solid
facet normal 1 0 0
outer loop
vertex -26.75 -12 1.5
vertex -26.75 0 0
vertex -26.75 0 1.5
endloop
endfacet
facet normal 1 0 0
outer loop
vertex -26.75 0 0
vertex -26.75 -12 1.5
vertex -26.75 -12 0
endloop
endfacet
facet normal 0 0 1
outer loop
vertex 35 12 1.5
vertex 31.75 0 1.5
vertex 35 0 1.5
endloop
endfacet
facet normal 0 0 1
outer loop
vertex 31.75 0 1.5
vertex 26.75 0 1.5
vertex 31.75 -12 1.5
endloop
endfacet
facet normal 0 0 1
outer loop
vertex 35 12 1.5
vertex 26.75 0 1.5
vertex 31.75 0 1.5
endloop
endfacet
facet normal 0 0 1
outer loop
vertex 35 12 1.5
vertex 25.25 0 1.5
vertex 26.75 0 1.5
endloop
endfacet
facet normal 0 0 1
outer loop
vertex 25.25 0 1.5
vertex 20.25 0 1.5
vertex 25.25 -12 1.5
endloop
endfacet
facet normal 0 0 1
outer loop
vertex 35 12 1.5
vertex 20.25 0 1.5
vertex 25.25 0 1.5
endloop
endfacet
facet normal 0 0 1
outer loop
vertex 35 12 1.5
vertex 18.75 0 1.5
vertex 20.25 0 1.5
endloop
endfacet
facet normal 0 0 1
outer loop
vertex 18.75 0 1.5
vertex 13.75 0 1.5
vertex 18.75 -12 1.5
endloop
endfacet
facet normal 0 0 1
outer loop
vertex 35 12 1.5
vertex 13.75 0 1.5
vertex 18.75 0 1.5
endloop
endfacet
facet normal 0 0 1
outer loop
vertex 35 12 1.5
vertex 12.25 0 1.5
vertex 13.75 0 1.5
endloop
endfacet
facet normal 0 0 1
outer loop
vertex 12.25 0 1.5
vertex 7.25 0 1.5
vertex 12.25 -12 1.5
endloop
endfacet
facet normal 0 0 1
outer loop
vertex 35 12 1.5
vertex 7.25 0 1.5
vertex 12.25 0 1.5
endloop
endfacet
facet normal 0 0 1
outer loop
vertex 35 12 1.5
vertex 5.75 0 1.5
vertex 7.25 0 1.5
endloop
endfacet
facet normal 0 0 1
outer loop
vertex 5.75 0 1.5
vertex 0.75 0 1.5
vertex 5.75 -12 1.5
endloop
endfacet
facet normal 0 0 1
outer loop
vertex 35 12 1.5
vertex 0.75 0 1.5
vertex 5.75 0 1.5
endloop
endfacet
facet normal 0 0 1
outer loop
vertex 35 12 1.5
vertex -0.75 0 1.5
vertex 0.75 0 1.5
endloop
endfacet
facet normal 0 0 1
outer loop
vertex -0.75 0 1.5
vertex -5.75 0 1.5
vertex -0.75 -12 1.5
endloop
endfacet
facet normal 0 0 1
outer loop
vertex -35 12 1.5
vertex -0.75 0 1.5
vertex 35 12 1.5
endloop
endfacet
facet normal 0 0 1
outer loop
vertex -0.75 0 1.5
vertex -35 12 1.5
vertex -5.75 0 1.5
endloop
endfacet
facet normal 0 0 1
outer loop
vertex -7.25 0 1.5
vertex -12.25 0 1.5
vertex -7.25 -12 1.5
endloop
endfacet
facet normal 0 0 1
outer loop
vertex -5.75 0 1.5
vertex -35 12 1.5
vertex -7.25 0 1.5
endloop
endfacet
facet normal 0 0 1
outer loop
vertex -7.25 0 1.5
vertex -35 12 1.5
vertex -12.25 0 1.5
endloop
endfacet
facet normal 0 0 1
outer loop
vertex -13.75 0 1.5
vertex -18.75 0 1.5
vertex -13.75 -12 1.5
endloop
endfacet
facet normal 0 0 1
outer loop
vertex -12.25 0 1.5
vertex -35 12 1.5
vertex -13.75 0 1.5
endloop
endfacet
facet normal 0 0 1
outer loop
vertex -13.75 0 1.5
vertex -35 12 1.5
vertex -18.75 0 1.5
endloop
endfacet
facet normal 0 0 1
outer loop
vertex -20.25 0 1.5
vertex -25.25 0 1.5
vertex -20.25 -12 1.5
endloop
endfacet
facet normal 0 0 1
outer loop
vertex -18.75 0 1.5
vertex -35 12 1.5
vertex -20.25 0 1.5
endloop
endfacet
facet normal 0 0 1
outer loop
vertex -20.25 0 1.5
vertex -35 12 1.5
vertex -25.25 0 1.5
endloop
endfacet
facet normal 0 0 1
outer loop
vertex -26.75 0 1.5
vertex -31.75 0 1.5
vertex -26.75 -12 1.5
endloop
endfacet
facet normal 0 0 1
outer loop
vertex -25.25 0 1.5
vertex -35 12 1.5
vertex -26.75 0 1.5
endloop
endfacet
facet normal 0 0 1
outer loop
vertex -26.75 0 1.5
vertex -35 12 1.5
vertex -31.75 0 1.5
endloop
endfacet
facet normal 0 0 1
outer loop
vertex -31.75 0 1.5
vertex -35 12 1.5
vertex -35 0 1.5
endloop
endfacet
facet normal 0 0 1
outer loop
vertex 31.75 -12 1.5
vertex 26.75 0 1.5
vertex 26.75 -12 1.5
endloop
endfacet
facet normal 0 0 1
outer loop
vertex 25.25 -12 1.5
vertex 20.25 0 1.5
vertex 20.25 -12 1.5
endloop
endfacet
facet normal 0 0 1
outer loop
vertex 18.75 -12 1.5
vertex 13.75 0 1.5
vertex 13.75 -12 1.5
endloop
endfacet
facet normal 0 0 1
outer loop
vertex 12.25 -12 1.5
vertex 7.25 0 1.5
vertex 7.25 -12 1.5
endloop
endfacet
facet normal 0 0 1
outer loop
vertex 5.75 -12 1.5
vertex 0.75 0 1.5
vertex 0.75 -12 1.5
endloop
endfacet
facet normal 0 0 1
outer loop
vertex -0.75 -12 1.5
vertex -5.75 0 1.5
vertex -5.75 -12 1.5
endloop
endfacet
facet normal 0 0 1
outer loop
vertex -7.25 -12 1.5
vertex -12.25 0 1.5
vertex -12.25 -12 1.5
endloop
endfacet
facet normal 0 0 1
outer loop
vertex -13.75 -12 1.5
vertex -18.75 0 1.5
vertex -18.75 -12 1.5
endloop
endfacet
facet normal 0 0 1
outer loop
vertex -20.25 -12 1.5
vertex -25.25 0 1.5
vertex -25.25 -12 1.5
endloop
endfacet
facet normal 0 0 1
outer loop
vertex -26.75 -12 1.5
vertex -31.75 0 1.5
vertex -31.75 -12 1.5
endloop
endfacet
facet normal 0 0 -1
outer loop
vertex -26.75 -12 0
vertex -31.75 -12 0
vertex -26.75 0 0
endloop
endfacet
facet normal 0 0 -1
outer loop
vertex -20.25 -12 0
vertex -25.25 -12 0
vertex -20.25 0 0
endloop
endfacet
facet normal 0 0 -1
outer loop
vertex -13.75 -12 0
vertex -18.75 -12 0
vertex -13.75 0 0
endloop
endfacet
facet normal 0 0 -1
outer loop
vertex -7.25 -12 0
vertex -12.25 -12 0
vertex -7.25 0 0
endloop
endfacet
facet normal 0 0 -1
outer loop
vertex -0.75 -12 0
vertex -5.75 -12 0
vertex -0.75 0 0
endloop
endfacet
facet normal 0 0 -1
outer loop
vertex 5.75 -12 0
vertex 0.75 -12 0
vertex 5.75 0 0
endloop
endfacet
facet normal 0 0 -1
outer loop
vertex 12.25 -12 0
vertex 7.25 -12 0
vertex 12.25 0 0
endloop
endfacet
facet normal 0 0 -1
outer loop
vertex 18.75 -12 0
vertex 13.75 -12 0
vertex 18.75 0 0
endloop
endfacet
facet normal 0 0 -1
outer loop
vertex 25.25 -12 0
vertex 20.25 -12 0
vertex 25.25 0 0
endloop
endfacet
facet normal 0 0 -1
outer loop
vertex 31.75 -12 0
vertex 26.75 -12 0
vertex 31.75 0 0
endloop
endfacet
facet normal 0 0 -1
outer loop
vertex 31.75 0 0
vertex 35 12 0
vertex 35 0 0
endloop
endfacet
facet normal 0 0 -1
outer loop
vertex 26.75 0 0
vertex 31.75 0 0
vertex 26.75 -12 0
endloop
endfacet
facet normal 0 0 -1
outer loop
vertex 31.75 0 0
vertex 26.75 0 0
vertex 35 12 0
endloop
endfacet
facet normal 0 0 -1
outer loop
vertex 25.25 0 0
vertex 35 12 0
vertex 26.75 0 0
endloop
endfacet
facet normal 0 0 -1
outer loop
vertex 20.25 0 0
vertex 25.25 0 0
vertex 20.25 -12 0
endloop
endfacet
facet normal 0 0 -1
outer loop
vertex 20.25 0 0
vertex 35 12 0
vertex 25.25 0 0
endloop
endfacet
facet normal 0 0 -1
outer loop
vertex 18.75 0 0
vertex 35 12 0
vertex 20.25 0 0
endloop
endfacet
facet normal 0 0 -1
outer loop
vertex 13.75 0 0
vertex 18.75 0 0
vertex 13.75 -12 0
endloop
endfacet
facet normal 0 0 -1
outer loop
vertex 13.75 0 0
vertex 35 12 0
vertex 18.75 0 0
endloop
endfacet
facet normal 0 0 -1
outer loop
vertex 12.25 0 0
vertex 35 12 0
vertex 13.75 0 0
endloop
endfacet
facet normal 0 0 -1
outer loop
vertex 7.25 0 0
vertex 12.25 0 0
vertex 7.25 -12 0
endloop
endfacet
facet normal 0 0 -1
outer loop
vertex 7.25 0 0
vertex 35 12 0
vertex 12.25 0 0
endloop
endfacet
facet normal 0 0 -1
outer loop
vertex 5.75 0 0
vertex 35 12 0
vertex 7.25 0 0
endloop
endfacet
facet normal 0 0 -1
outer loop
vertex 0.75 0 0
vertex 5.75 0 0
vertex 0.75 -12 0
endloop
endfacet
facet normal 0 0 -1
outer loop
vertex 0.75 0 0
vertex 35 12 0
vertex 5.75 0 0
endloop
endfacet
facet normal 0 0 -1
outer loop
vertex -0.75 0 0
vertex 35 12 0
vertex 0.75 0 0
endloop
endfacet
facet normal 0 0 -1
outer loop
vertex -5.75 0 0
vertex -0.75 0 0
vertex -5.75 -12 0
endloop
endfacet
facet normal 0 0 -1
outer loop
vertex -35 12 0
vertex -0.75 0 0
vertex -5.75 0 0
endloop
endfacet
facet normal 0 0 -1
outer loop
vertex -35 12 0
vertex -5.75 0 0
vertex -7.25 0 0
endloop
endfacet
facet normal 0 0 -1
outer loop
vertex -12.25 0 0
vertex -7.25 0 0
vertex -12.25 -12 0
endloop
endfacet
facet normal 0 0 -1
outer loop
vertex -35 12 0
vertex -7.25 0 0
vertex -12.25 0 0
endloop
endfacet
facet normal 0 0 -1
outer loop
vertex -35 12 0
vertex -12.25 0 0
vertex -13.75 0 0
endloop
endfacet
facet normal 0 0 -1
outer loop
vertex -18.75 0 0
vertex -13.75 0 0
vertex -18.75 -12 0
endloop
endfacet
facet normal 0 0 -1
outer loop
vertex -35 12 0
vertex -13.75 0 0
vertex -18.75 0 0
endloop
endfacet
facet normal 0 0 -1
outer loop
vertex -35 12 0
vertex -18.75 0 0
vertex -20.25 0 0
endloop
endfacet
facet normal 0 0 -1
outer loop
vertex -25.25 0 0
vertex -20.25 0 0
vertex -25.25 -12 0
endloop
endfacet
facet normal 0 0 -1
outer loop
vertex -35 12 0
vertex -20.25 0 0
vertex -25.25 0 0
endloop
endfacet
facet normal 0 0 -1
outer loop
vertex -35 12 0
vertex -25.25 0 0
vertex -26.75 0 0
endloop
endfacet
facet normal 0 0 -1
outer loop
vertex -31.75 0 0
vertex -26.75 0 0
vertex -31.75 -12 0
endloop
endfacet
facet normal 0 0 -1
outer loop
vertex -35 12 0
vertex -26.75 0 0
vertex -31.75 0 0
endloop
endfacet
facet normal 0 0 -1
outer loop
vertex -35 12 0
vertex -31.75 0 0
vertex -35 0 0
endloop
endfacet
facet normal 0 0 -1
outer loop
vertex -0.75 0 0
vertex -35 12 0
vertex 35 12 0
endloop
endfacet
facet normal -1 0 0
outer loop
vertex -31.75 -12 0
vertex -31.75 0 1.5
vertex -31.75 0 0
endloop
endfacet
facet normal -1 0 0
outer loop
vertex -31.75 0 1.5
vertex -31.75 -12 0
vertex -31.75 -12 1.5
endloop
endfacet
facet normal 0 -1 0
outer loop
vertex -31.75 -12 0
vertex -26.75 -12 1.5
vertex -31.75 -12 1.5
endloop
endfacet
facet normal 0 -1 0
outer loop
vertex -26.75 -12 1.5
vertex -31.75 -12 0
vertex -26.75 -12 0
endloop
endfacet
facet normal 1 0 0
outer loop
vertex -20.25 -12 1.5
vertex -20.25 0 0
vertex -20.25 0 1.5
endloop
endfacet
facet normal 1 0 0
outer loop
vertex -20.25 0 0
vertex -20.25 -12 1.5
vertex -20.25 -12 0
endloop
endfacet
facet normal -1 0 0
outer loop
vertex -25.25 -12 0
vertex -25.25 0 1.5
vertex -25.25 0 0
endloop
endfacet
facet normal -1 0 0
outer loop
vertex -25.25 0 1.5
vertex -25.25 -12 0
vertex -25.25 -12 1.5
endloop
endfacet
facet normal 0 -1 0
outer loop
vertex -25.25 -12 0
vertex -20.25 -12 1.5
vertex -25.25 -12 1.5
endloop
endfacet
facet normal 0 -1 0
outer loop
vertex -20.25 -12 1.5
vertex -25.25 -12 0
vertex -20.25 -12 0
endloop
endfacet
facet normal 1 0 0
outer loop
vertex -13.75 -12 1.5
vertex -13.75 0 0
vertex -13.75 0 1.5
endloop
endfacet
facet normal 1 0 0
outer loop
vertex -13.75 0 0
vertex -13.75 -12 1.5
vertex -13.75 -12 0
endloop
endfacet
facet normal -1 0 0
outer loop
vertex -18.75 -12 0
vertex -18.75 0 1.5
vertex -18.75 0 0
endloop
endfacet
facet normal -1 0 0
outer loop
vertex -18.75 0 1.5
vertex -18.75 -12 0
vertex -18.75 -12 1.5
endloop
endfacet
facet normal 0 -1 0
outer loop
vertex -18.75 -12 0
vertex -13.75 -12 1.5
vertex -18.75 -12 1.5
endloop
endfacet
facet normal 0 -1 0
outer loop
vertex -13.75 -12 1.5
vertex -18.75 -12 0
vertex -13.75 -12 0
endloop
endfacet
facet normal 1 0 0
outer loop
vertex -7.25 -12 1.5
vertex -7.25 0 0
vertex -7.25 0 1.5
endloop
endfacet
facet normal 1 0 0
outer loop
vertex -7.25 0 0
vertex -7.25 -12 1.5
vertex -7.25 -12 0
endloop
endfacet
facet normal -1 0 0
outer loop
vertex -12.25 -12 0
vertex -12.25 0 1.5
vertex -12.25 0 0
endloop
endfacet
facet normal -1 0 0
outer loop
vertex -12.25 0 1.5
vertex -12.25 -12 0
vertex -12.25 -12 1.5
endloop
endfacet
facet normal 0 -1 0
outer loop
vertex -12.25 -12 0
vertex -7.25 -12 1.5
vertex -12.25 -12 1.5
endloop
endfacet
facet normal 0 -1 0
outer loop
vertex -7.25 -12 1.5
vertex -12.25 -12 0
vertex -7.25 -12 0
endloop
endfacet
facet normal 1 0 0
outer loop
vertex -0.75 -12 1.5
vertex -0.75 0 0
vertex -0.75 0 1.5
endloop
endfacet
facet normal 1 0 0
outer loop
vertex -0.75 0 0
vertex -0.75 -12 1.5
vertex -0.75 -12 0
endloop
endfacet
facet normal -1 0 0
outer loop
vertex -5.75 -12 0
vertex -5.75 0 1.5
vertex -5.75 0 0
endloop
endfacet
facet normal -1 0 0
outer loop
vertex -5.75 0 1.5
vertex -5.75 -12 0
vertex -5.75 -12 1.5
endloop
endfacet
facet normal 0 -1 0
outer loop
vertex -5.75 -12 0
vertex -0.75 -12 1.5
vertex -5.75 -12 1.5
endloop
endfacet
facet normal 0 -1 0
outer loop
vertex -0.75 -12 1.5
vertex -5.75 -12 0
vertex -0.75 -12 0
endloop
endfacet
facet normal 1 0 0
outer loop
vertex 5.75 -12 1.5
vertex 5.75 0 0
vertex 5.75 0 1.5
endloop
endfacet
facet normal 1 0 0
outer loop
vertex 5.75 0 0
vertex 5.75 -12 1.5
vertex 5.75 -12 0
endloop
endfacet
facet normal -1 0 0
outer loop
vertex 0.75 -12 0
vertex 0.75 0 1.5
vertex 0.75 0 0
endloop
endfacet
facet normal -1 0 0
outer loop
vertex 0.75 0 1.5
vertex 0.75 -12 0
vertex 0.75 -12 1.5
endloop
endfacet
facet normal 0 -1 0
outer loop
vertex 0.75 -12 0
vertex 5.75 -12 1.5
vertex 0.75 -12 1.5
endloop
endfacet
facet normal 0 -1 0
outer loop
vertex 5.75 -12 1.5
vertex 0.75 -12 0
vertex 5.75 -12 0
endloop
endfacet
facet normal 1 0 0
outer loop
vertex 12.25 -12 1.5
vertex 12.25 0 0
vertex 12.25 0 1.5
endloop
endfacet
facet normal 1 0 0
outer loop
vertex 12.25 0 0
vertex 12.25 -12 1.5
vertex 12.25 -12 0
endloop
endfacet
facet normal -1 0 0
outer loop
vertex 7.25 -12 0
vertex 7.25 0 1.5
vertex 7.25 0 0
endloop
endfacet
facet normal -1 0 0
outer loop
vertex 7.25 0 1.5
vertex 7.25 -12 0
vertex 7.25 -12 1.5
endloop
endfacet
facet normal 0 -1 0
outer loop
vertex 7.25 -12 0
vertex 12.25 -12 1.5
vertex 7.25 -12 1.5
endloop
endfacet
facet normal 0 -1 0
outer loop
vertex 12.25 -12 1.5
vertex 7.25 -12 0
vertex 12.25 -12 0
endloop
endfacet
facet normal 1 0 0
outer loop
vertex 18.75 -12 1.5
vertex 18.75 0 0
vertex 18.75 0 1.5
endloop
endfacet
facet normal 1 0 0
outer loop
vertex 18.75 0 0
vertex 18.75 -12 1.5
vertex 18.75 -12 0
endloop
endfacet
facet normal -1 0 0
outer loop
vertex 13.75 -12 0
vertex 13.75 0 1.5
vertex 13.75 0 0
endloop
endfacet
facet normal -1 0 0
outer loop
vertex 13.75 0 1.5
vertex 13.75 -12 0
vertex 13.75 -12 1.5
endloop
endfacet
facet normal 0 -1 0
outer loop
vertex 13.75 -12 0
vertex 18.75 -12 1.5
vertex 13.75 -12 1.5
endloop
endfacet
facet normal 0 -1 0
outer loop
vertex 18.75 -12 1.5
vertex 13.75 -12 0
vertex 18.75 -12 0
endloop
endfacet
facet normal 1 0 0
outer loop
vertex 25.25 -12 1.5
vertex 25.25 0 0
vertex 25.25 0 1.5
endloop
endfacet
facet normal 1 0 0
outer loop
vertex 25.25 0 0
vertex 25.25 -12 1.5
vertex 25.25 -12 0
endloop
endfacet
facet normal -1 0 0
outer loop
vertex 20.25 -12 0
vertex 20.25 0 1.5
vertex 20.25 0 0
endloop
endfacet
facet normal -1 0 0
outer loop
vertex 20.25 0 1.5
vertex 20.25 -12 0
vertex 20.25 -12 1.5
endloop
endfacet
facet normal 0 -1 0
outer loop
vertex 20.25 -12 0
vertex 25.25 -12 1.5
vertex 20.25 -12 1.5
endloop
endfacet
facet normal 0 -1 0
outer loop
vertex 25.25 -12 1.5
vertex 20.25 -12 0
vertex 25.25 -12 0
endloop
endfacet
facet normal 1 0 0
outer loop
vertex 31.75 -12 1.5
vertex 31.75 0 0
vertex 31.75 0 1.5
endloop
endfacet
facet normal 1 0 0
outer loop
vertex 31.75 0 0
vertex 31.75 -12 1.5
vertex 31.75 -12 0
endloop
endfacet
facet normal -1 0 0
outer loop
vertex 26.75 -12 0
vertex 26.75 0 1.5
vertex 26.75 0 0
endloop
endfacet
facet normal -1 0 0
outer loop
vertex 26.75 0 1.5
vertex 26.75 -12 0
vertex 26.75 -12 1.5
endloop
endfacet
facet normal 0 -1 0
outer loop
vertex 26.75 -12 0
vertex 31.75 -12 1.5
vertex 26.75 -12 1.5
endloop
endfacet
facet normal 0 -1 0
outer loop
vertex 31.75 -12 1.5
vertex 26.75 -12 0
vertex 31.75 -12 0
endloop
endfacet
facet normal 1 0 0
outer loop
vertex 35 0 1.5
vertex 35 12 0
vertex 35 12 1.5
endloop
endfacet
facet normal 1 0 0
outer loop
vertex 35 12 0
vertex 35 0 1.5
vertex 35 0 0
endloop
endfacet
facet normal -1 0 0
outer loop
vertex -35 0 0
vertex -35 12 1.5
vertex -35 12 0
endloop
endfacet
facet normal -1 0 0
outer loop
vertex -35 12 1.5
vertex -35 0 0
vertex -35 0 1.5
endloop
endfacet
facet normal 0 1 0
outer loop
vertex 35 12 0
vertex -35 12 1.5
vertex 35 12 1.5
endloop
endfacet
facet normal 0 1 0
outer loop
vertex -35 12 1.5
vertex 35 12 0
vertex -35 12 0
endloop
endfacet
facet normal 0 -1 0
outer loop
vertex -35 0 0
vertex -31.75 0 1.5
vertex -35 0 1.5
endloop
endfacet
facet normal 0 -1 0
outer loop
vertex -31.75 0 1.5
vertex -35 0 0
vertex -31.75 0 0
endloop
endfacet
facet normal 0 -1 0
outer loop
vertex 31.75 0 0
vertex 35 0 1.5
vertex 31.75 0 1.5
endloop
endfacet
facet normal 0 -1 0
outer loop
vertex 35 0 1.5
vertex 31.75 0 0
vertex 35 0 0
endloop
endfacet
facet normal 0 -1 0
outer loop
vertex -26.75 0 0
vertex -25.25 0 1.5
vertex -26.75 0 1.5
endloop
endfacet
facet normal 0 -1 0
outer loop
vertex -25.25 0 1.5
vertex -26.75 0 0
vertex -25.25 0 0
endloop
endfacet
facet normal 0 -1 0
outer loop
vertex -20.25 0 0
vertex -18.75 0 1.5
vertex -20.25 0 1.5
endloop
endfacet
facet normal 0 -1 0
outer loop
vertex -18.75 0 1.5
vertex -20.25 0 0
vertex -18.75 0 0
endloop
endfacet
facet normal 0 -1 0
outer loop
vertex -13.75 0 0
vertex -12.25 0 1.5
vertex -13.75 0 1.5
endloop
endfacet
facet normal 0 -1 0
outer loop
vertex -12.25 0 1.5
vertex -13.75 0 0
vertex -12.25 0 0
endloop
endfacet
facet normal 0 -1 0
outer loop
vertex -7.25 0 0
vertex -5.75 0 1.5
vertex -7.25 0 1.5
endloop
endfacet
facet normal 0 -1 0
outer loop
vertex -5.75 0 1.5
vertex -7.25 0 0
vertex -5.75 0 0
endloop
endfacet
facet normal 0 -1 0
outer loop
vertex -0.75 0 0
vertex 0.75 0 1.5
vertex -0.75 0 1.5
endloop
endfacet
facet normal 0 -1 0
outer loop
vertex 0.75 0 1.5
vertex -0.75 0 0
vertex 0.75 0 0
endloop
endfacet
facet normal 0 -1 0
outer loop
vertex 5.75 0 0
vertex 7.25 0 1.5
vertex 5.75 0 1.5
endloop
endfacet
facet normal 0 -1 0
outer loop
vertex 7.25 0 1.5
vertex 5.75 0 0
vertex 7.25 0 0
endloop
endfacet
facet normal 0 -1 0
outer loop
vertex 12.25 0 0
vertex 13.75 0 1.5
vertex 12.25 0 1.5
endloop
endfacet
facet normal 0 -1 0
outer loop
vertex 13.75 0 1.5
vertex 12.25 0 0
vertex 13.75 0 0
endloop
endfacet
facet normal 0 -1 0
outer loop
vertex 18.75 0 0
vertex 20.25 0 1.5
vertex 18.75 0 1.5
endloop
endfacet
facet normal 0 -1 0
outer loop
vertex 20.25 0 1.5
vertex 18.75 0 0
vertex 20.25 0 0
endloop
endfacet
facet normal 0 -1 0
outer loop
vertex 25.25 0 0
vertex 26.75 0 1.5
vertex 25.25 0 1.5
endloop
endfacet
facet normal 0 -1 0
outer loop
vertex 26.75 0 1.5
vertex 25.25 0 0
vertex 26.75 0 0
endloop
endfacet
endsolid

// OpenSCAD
// 10-well agarose gel comb, printed flat
$fn = 64;

plate_t     = 1.5;   // plate thickness (Z)
spine_len   = 70;    // spine length (X)
spine_w     = 12;    // spine width (Y)
n_teeth     = 10;    // number of teeth
tooth_w     = 5.0;   // tooth width (X)
tooth_len   = 12;    // tooth length (Y)
tooth_gap   = 1.5;   // gap between teeth (X)
overlap     = 0.5;   // tooth overlap into spine for a clean union

pitch      = tooth_w + tooth_gap;
row_w      = n_teeth * tooth_w + (n_teeth - 1) * tooth_gap;  // 63.5
x0         = -row_w / 2;

union() {
    // spine: Y from 0 to spine_w (teeth hang in -Y from y = 0)
    translate([-spine_len / 2, 0, 0])
        cube([spine_len, spine_w, plate_t]);

    // teeth
    for (i = [0 : n_teeth - 1])
        translate([x0 + i * pitch, -tooth_len, 0])
            cube([tooth_w, tooth_len + overlap, plate_t]);
}
